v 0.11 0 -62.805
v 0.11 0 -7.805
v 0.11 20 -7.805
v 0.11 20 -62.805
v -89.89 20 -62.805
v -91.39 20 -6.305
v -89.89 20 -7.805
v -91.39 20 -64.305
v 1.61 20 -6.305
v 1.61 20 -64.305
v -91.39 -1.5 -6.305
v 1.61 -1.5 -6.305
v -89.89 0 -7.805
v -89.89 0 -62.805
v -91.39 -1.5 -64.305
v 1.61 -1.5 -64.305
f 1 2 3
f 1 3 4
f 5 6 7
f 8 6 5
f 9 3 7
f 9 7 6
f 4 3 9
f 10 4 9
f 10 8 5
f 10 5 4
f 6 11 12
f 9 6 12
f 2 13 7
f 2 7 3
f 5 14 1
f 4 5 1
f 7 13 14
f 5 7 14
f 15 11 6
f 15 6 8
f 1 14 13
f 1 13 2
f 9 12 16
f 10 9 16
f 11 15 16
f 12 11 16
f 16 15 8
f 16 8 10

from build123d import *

# Parameters (mm, degrees)
ESBO_O1_W                = 90
ESBO_O1_H                = 55
RESSALTO_EXTRUS_O1_DEPTH = 20
CASCA1_T                 = 1.5


with BuildPart() as part:
    # Esboço1 → Ressalto-extrusão1 (new body)
    with BuildSketch(Plane(origin=(0, 0, 0), x_dir=(1, 0, 0), z_dir=(0, 1, 0))):
        with Locations((-44.890471739, 35.305061179)):
            Rectangle(ESBO_O1_W, ESBO_O1_H)
    extrude(amount=RESSALTO_EXTRUS_O1_DEPTH)

    # Casca1
    casca1_openings = [part.faces().sort_by_distance(p)[0] for p in [
        (-44.890471739, 20, -35.305061179),
    ]]
    offset(amount=CASCA1_T, openings=casca1_openings, kind=Kind.INTERSECTION)


solid = part.part
